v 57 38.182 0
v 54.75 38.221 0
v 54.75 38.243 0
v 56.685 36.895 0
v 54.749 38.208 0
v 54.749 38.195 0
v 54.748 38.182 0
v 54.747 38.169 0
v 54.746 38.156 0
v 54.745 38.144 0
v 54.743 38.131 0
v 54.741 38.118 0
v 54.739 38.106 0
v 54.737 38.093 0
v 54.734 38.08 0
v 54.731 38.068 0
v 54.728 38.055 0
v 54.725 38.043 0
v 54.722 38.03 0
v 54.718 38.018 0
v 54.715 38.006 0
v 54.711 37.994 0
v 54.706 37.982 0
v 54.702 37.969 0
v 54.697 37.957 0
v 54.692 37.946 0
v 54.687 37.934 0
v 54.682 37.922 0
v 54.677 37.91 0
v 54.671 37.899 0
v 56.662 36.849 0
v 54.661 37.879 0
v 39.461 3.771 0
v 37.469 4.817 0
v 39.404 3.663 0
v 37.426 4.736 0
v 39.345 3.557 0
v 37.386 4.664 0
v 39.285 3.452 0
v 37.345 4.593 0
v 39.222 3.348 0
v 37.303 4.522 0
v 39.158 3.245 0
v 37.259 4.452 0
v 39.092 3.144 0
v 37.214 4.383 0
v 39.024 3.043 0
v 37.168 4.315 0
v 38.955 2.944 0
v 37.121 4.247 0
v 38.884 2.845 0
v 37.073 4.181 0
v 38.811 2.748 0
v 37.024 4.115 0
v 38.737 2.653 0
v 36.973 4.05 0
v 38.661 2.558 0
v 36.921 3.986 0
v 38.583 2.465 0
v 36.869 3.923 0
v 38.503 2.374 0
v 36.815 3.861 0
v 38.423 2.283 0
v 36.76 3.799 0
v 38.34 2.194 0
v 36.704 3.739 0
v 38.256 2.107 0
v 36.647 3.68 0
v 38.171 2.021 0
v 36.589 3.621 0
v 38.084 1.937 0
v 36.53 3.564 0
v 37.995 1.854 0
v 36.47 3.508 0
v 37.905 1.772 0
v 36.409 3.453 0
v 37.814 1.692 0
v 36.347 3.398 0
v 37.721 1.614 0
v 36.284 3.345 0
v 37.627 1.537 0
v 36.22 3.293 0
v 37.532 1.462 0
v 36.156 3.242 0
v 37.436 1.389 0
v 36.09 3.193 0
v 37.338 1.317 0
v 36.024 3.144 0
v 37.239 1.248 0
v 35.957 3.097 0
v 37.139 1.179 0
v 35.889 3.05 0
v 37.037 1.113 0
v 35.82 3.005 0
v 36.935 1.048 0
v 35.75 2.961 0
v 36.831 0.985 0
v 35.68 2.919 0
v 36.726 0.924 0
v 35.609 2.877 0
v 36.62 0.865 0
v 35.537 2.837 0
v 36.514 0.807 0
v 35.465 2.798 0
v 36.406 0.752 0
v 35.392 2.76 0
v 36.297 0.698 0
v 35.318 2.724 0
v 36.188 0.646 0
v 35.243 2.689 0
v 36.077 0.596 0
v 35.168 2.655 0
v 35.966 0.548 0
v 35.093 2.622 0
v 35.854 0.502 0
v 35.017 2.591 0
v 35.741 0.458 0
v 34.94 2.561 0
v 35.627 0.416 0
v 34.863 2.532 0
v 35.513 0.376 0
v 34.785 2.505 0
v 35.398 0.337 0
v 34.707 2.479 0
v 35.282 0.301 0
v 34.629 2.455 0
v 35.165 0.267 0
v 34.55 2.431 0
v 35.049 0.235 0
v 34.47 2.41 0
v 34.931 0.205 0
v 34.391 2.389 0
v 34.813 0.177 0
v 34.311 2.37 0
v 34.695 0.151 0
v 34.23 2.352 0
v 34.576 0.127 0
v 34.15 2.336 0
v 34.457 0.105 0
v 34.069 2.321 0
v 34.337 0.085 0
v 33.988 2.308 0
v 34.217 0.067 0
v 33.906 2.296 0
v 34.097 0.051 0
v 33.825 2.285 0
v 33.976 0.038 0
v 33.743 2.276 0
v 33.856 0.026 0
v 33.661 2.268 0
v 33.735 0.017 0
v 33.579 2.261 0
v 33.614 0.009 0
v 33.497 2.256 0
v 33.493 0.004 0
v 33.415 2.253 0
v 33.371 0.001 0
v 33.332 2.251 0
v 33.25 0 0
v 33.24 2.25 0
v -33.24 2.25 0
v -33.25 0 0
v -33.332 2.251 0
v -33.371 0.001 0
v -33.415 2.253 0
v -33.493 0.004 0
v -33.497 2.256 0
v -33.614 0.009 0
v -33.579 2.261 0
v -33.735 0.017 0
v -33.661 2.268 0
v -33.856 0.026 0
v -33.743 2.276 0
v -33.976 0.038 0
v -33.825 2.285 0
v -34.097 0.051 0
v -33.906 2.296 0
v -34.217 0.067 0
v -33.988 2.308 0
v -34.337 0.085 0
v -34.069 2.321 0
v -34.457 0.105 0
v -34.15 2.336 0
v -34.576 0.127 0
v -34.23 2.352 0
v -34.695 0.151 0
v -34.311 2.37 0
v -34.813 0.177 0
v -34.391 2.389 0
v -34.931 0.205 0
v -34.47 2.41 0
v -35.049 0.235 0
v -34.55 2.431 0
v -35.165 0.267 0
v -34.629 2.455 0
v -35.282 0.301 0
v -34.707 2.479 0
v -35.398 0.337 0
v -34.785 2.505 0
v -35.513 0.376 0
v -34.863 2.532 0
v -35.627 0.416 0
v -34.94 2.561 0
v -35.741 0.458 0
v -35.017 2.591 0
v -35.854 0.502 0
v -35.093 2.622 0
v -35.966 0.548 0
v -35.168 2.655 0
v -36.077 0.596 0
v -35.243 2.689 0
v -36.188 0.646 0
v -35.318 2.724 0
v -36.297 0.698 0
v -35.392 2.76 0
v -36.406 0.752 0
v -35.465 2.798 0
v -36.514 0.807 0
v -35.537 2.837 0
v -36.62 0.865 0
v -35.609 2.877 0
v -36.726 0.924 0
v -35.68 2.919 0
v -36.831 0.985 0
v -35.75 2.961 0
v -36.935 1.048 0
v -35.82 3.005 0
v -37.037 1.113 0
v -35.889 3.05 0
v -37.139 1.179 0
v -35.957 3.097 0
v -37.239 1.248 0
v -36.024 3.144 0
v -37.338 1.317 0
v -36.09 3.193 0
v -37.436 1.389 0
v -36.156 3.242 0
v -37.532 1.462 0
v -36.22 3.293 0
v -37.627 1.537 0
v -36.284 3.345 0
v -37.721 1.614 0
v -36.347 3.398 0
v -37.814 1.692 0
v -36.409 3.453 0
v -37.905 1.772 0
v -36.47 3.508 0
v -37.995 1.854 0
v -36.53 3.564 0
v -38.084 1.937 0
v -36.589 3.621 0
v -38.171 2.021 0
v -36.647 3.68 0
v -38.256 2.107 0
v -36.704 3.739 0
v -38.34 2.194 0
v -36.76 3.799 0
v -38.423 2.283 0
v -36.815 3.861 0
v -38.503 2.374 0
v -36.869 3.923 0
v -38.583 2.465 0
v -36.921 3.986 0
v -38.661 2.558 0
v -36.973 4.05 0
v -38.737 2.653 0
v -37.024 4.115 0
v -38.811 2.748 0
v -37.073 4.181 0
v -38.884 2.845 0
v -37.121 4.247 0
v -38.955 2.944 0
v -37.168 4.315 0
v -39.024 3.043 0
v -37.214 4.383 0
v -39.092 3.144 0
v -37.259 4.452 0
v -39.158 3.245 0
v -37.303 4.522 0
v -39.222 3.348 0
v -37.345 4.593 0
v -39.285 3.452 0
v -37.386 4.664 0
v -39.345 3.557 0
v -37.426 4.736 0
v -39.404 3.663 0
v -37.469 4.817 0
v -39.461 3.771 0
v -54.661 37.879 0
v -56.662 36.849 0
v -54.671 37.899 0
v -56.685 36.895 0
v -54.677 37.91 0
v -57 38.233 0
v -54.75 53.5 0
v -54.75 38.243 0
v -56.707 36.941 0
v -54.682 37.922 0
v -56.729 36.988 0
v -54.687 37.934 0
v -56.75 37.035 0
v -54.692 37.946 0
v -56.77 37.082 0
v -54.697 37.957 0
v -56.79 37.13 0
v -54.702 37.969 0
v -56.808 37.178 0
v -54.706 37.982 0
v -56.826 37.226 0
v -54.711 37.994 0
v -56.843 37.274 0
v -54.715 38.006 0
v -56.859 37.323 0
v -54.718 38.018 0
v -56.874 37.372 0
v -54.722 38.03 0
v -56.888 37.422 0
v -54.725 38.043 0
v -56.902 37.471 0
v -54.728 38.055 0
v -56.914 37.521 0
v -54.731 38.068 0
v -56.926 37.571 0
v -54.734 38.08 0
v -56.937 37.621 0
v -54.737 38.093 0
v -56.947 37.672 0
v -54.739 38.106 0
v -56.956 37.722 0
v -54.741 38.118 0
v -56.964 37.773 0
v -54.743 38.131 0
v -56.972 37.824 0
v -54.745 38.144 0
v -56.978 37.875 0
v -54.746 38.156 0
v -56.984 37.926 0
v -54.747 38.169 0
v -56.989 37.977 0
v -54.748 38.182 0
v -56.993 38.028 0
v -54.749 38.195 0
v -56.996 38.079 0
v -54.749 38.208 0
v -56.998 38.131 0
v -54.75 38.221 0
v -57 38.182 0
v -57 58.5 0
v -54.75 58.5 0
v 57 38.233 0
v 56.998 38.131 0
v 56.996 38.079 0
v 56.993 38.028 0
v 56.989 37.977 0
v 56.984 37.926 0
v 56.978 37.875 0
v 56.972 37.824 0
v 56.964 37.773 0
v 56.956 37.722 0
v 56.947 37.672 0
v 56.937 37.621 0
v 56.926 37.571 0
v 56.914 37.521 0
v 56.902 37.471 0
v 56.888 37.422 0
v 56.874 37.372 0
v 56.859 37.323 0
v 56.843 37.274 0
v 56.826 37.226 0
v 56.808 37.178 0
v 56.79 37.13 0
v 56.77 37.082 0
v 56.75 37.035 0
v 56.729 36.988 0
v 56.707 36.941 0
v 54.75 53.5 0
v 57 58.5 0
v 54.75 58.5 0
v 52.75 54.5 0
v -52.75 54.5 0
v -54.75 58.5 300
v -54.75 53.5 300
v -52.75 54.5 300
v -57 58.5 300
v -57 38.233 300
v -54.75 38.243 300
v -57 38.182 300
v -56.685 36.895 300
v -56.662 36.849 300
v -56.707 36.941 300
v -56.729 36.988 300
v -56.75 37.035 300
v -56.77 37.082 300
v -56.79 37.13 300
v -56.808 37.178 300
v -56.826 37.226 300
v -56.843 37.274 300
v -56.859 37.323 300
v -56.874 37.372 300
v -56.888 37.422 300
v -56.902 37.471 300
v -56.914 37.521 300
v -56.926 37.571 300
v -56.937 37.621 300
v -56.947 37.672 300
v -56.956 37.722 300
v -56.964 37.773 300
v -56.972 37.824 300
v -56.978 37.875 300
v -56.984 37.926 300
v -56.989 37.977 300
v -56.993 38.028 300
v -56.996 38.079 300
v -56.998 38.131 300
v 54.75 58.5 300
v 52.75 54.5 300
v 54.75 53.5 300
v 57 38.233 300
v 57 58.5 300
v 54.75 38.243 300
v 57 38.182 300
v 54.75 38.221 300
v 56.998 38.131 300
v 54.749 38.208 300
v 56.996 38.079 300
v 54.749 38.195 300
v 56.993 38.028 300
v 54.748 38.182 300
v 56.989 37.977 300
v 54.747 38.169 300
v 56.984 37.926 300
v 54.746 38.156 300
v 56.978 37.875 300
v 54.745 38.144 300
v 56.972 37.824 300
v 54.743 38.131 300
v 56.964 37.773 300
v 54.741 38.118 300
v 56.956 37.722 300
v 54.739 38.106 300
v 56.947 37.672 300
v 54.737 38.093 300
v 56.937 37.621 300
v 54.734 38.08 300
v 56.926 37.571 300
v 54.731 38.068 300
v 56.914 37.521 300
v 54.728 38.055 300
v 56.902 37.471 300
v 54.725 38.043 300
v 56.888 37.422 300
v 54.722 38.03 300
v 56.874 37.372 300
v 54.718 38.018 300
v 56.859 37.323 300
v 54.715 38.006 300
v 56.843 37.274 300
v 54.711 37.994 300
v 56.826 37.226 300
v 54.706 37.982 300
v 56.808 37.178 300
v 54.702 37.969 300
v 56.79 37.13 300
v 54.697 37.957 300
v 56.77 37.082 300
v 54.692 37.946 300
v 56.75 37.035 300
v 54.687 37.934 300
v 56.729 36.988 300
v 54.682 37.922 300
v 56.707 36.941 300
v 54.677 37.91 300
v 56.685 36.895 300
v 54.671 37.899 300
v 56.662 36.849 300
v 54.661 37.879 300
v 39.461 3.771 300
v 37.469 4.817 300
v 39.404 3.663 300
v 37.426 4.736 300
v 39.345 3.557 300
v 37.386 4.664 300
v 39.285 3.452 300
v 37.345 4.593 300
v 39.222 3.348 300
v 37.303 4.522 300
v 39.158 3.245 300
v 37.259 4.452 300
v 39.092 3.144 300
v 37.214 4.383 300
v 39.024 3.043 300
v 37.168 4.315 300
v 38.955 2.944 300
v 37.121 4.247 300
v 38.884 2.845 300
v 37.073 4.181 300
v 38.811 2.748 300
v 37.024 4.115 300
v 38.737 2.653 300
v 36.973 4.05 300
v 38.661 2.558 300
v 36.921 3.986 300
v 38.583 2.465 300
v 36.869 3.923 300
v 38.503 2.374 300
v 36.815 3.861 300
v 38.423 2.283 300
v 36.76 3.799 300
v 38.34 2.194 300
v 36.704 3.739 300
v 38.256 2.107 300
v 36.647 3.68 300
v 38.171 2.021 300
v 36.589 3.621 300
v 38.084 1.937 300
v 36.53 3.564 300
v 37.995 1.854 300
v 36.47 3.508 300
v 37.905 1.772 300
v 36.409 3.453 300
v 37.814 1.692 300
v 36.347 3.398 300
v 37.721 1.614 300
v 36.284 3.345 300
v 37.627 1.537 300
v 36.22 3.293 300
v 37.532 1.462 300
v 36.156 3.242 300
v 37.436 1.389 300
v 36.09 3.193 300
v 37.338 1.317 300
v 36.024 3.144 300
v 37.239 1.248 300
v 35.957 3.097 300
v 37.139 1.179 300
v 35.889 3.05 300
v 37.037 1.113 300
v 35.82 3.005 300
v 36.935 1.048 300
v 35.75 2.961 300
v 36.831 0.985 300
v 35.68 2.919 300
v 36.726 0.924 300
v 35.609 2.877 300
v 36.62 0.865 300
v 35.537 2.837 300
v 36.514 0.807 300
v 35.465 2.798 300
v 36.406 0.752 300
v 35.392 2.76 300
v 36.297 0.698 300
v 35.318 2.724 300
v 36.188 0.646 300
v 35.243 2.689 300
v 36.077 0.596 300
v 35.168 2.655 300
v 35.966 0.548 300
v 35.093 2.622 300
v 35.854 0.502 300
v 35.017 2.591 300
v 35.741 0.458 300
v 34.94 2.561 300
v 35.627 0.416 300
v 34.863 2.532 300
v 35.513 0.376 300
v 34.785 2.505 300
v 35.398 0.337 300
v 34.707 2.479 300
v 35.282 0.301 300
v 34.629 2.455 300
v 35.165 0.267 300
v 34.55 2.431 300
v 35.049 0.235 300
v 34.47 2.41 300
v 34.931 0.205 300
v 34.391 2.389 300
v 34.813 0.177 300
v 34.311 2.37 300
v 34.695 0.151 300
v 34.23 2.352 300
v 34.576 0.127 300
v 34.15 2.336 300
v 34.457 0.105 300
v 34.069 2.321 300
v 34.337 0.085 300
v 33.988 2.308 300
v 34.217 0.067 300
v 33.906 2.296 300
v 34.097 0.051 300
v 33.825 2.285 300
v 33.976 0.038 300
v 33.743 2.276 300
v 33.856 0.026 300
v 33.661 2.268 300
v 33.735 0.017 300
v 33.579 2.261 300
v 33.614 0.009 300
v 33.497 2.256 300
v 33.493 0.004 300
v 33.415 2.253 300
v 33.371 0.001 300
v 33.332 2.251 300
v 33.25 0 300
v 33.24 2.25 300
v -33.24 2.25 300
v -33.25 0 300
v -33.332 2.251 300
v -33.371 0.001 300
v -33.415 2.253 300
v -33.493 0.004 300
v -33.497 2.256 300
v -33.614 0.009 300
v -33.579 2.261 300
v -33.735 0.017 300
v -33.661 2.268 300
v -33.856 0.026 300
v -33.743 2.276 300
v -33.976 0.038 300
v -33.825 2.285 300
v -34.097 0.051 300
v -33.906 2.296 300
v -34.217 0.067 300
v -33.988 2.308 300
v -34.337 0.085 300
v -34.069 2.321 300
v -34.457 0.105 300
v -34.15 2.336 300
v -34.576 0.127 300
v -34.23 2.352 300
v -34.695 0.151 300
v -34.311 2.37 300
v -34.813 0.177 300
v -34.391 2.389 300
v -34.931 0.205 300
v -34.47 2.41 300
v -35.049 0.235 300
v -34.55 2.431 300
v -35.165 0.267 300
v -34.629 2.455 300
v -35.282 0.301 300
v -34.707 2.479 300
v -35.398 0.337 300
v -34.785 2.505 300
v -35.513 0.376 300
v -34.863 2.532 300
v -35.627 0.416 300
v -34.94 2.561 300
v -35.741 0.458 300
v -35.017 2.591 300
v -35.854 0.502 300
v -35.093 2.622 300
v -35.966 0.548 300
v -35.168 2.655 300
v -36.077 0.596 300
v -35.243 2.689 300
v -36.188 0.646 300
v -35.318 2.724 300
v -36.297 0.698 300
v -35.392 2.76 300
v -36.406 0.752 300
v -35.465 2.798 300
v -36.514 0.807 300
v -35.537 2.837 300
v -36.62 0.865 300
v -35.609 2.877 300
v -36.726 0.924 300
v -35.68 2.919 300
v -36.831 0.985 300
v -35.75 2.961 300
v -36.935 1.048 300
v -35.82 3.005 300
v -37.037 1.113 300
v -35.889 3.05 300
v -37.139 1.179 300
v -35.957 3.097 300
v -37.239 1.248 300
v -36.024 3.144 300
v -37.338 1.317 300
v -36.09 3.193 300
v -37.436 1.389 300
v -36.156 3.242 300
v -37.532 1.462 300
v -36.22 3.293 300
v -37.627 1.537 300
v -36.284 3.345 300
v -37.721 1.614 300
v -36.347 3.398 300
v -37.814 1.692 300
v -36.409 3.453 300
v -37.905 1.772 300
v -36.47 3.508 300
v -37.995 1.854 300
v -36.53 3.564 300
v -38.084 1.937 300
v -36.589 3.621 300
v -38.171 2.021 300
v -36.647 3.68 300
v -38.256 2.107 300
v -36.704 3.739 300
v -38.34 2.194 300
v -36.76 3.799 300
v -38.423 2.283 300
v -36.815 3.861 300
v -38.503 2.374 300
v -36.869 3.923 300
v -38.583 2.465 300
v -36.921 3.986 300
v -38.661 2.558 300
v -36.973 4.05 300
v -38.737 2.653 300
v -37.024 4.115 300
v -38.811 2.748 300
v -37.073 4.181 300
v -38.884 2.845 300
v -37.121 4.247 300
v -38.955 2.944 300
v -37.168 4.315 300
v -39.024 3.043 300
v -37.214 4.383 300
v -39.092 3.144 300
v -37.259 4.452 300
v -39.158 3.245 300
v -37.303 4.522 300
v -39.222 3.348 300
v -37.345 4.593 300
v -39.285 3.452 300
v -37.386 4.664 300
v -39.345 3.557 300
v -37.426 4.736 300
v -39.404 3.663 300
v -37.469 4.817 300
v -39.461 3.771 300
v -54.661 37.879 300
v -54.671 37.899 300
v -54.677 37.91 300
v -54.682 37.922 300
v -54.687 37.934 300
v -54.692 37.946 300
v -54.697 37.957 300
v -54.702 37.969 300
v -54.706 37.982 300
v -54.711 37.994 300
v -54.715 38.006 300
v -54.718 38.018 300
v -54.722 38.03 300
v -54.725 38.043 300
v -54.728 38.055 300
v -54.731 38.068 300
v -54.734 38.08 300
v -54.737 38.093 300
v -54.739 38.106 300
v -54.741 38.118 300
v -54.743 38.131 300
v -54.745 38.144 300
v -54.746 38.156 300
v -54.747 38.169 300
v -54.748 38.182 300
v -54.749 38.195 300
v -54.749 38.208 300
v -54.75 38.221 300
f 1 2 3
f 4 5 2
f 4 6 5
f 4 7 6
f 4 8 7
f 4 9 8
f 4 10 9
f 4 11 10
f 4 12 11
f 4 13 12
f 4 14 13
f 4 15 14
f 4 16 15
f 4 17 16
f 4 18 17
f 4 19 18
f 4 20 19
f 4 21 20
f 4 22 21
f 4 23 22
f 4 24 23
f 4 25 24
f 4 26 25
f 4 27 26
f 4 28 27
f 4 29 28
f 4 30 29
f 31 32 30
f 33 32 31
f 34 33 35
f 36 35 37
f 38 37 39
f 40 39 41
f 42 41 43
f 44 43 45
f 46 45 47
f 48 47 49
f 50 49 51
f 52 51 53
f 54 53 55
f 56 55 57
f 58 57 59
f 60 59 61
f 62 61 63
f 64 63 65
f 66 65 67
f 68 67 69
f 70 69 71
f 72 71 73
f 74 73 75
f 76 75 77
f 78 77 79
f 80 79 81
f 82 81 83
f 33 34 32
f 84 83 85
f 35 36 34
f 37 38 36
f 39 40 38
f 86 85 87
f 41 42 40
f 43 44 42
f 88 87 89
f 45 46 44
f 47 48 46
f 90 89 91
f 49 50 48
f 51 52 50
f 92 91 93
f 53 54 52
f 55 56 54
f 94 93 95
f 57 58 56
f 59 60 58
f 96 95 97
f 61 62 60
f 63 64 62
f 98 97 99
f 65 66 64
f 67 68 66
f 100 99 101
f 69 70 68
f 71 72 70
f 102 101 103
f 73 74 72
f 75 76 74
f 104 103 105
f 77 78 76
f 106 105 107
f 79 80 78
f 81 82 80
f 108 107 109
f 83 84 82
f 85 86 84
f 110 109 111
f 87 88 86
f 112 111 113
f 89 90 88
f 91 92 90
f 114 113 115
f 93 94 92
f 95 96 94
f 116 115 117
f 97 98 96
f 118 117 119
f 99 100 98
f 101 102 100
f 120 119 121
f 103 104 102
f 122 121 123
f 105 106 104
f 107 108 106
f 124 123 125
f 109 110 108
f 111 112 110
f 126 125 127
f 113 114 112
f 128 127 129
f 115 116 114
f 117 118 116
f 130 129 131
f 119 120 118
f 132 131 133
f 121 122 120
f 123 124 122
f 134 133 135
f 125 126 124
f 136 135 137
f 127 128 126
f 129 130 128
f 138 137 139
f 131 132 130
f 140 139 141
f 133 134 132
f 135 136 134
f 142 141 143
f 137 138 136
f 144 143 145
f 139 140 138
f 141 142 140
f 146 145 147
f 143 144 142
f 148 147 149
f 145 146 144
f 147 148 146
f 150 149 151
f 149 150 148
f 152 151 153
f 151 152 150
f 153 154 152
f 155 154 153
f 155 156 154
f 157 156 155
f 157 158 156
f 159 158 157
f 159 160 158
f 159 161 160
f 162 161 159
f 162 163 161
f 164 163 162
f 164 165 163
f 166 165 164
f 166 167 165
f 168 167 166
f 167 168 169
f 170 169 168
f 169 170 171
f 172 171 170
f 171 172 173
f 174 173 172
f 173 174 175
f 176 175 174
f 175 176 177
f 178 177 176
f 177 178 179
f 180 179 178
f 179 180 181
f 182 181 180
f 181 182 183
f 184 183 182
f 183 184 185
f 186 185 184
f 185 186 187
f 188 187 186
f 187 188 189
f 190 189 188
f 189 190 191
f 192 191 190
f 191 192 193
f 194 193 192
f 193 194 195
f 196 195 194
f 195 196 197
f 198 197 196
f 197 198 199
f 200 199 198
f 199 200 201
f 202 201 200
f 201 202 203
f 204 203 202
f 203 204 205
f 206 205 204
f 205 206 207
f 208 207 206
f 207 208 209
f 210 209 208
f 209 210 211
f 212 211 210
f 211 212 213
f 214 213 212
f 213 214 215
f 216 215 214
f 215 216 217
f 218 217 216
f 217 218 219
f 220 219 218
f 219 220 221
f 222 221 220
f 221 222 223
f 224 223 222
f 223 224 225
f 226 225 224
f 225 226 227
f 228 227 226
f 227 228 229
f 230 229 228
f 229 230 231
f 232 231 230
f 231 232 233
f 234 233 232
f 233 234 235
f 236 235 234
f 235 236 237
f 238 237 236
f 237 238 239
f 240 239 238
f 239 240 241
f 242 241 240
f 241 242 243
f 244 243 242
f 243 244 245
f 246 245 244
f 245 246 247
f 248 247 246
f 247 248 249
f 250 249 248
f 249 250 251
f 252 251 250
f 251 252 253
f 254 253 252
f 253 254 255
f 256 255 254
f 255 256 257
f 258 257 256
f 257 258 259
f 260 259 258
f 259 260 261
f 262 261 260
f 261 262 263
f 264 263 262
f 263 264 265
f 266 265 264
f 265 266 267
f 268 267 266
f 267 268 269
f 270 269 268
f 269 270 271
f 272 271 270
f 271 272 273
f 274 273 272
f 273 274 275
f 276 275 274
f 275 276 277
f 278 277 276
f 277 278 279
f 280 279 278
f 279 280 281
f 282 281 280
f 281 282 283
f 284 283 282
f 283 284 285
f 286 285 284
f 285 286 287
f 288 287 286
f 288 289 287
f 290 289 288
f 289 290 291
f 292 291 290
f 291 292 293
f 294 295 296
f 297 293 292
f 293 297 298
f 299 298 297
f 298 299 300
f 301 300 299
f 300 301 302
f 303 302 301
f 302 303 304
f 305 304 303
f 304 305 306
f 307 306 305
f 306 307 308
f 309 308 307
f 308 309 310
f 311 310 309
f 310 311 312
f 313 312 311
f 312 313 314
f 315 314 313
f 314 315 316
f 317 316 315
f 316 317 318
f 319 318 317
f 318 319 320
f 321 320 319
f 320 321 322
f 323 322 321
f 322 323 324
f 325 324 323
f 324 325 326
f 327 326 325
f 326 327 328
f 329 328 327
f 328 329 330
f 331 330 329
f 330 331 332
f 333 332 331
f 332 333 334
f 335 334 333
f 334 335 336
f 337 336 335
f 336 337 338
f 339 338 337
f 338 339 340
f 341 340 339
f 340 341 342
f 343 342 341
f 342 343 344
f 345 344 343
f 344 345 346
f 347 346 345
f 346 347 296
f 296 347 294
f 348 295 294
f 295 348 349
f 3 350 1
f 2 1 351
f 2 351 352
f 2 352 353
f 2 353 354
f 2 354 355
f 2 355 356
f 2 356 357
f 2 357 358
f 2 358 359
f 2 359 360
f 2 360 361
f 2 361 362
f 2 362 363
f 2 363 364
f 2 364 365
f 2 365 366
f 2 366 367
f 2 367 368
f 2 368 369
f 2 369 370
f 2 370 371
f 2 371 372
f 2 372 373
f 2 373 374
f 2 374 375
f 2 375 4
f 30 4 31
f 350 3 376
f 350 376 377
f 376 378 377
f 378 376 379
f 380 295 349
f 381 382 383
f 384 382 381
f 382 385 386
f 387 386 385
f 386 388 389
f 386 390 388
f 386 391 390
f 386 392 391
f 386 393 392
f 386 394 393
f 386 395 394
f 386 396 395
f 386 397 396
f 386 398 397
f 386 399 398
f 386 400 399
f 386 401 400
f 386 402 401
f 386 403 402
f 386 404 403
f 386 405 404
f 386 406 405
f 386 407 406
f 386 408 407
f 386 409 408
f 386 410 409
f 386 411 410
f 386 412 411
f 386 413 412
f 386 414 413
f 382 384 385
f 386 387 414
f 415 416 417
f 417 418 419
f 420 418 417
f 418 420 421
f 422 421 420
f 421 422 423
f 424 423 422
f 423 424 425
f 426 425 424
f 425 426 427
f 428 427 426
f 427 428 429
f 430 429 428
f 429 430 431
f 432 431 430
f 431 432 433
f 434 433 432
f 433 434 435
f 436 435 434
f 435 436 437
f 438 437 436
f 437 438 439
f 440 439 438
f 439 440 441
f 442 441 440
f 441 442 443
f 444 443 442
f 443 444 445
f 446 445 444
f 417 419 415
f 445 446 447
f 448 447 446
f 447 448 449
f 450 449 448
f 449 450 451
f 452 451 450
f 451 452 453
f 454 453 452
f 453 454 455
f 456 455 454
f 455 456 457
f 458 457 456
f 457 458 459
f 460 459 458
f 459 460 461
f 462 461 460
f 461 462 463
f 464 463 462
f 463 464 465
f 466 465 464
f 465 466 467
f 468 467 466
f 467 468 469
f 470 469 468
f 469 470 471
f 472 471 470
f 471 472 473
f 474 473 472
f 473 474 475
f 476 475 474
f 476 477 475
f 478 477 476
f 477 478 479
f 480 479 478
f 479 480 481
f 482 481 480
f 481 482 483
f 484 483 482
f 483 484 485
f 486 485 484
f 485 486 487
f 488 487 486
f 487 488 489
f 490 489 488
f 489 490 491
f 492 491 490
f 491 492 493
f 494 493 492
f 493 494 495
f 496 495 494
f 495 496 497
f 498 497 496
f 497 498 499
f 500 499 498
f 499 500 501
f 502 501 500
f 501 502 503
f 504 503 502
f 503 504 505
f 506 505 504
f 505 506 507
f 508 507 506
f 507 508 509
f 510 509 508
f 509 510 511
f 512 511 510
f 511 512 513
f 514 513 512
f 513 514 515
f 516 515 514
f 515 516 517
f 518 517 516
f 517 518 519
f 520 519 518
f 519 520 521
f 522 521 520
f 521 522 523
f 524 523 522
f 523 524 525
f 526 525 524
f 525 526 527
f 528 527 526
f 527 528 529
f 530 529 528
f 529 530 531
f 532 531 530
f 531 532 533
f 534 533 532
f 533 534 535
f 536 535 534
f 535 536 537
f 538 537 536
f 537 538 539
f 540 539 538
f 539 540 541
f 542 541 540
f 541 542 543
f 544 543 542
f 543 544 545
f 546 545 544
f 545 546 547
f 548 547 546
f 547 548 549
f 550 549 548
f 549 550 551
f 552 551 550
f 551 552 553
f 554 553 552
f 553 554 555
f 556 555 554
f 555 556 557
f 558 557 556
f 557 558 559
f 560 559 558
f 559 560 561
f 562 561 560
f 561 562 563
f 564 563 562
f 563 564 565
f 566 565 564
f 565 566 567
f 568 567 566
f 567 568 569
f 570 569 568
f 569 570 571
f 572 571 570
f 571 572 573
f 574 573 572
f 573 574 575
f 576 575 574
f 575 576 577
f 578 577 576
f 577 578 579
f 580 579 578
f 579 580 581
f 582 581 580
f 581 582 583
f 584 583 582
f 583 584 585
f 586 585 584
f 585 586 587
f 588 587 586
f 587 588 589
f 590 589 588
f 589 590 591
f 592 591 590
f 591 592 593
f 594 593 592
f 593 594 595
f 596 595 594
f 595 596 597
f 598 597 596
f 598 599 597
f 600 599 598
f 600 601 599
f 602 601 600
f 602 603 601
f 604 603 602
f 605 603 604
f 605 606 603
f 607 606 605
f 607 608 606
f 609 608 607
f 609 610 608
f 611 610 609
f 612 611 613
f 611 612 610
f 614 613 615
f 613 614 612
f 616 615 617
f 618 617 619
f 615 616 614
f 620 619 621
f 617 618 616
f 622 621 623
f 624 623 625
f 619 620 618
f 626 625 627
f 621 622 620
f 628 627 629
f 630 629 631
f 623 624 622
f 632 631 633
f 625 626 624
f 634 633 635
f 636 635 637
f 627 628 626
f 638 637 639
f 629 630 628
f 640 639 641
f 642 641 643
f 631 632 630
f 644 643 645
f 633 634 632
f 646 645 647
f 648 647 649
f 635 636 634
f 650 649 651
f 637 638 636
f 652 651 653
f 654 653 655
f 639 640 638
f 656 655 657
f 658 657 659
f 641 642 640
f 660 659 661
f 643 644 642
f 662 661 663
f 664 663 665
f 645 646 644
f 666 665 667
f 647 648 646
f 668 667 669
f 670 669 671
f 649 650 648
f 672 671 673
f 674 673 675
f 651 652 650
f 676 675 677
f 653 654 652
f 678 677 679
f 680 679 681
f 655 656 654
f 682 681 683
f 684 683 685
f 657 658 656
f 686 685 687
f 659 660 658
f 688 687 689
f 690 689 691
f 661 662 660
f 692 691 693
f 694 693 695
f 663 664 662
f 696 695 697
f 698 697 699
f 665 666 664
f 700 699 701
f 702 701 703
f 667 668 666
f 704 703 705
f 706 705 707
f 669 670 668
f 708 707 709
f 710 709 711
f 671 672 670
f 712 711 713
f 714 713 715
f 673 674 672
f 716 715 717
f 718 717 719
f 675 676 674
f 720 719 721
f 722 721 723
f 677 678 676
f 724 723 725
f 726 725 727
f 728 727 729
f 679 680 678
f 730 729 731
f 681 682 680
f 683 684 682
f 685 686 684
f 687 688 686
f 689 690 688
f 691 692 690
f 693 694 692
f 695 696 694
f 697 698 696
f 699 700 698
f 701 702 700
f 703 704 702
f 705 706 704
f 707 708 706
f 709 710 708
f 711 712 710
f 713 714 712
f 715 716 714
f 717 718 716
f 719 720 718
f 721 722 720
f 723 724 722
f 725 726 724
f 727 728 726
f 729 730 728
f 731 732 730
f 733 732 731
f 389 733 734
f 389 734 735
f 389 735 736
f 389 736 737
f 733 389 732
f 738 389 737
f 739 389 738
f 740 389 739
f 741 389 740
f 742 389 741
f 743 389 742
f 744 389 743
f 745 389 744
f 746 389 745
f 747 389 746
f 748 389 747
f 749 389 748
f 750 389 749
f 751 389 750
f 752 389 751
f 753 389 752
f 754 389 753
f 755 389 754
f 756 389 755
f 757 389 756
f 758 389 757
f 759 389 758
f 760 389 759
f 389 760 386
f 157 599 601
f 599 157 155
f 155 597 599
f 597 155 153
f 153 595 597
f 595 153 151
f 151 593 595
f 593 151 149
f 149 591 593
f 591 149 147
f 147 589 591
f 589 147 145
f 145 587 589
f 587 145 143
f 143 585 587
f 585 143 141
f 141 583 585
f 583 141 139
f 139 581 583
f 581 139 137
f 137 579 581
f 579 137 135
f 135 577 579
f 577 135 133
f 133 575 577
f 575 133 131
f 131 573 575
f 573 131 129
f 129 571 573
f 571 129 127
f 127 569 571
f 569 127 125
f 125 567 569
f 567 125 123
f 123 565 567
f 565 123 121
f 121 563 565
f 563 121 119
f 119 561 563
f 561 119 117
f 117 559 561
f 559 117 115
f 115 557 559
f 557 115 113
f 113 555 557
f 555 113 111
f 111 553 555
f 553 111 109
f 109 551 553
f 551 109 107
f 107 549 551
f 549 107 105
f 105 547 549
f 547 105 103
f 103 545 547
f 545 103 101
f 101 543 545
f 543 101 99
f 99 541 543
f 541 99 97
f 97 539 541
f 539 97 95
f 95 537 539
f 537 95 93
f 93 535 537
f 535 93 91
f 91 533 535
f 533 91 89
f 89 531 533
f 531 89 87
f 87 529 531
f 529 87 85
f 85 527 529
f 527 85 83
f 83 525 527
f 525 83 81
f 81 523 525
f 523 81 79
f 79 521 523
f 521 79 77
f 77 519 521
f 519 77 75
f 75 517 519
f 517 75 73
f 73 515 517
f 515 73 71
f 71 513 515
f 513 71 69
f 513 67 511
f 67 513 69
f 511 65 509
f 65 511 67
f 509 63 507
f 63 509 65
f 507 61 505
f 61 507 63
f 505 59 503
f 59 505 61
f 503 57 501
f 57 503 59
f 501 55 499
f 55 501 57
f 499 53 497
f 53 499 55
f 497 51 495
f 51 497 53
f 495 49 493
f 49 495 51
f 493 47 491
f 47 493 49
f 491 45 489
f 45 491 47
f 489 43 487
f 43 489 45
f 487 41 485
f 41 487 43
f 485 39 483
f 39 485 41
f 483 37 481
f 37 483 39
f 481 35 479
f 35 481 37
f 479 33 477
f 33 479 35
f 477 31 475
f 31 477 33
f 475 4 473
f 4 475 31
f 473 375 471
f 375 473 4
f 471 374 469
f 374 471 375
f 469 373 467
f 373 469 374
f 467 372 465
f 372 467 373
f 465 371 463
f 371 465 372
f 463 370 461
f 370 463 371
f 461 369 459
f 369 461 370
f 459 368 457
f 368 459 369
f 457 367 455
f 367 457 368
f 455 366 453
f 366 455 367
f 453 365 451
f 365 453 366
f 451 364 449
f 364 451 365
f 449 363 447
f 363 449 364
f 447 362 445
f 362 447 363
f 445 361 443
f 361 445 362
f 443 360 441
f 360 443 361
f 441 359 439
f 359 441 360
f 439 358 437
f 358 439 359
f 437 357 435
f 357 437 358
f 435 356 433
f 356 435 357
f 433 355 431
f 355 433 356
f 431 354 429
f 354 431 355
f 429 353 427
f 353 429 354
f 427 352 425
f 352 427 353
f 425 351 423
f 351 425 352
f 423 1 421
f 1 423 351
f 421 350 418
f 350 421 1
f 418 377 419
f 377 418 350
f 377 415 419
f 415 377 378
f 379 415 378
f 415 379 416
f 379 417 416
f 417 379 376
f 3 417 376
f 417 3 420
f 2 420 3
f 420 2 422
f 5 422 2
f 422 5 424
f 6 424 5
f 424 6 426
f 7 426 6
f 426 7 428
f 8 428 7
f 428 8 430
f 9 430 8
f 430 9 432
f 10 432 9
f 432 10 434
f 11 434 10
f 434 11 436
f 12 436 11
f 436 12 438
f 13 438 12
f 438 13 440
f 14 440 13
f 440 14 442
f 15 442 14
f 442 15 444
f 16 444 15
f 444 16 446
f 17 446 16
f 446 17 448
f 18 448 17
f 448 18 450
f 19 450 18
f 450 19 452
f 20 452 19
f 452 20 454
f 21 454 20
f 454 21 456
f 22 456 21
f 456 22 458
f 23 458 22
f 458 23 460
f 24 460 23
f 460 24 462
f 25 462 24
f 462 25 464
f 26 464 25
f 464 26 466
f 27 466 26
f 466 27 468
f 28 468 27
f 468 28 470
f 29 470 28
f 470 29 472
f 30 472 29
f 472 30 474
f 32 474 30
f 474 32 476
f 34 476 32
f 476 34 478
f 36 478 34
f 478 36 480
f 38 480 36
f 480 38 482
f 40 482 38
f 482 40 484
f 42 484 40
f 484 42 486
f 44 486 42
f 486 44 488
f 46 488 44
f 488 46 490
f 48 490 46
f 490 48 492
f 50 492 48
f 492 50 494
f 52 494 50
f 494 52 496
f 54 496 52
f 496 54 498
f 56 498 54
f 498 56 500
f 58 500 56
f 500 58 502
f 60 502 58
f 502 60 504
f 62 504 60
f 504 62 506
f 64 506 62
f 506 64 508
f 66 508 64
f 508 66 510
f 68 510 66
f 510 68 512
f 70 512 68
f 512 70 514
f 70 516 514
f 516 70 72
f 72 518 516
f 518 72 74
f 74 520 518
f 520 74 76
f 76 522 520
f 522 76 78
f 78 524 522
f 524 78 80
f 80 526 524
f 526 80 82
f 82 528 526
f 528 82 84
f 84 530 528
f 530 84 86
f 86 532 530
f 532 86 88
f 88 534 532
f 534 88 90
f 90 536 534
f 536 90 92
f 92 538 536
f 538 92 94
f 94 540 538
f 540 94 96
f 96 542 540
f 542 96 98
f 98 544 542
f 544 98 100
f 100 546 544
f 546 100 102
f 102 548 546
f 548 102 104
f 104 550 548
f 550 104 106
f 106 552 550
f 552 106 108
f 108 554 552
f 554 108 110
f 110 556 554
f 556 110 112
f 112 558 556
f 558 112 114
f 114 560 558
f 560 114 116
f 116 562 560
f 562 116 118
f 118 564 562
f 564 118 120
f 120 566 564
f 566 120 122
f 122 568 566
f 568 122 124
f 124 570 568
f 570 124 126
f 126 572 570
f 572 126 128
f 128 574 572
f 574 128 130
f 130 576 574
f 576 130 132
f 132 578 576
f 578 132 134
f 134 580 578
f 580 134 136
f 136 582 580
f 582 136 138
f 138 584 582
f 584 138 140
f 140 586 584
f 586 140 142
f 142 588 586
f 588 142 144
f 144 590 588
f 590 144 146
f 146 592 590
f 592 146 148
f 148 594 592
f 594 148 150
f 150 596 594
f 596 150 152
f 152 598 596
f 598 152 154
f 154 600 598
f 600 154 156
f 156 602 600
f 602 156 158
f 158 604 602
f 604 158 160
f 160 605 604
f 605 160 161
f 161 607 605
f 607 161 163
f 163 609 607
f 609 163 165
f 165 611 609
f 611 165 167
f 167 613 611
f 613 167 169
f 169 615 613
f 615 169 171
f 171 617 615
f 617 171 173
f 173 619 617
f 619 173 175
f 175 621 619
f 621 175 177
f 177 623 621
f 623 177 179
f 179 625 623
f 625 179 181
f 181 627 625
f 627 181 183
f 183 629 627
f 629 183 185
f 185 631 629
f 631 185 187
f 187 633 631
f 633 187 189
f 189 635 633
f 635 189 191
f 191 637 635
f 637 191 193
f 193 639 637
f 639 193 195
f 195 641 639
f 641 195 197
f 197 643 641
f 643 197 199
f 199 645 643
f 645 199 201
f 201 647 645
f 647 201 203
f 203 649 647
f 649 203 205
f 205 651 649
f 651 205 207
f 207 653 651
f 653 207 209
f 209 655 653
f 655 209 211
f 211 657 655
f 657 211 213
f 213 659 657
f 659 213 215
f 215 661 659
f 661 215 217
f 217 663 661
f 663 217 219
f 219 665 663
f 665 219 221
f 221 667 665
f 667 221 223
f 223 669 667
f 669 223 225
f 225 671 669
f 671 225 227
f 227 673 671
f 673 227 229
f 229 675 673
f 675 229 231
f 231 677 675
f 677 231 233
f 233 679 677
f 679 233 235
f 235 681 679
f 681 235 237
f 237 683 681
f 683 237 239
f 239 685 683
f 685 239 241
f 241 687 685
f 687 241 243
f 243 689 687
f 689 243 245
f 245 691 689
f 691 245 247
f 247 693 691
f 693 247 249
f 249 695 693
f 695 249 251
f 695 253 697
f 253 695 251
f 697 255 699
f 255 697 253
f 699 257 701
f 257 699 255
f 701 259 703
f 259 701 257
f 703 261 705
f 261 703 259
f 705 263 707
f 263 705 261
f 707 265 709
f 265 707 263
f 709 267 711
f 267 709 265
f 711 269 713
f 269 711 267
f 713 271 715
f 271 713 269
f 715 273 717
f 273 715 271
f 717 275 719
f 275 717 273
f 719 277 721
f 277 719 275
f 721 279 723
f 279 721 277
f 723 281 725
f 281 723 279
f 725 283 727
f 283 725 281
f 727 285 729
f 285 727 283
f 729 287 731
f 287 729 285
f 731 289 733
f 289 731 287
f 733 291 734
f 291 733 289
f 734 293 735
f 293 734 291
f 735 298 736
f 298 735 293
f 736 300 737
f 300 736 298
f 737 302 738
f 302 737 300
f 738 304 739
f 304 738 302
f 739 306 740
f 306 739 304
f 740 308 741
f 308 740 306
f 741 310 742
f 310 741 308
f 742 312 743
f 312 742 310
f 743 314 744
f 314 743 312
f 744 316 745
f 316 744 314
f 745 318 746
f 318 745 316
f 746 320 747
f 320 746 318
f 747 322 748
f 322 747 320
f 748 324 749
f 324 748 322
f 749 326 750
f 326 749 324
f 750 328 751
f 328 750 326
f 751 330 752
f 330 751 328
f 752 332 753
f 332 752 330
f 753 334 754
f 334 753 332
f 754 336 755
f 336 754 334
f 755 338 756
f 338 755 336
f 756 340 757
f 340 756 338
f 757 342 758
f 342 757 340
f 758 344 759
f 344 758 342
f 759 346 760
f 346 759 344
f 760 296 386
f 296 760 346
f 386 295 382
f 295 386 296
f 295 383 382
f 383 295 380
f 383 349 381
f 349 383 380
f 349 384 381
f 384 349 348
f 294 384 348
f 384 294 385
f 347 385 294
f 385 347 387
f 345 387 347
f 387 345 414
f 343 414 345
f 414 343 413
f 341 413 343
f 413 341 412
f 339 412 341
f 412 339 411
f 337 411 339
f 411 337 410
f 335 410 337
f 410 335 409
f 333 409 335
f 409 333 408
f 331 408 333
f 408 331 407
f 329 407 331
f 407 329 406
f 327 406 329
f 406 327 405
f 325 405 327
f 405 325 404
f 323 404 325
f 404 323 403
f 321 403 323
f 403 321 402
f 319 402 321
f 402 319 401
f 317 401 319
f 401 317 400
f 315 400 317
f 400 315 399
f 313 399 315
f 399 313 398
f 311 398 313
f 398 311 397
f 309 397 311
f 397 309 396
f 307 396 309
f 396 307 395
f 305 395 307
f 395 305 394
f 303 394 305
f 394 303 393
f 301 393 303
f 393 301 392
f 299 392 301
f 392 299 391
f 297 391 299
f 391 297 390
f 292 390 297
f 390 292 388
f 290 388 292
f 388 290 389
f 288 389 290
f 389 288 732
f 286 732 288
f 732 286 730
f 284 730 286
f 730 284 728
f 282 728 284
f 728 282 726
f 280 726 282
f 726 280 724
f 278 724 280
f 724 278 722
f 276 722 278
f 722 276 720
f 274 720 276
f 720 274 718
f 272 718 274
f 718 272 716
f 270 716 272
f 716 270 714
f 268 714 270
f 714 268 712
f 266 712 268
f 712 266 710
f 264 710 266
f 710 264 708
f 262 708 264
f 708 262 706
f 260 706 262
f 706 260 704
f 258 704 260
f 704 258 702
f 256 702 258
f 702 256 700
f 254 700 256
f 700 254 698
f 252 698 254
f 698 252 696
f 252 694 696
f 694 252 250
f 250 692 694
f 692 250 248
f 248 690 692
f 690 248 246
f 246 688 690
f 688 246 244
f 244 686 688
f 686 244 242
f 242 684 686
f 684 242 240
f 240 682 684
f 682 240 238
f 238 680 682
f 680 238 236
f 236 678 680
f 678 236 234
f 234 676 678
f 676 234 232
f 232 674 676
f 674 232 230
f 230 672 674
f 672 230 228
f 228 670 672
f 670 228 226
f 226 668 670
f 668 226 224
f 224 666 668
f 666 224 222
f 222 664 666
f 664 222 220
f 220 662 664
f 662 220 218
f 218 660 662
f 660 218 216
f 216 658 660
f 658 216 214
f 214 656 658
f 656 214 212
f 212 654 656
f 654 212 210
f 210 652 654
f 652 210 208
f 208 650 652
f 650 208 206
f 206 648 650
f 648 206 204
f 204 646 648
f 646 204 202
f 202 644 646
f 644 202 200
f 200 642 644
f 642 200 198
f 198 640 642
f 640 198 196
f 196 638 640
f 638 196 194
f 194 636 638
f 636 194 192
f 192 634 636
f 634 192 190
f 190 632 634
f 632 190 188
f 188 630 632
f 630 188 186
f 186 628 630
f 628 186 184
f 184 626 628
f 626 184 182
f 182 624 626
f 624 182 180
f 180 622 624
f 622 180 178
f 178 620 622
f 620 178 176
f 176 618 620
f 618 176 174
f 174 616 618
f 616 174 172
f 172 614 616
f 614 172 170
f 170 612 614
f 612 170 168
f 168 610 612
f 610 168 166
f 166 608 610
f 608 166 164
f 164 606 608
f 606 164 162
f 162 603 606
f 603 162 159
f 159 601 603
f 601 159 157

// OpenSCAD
$fn = 50;

difference() {
	union() {
		linear_extrude(height = 300.0) {
			polygon(points = [[56.9995601, 38.1820114], [56.9982404, 38.1306519], [56.9960415, 38.0793225], [56.9929638, 38.0280383], [56.9890084, 37.9768144], [56.9841763, 37.9256657], [56.978469, 37.8746072], [56.9718882, 37.823654], [56.9644358, 37.7728209], [56.956114, 37.7221229], [56.9469252, 37.6715749], [56.9368722, 37.6211916], [56.9259578, 37.5709879], [56.9141852, 37.5209784], [56.901558, 37.4711779], [56.8880798, 37.4216009], [56.8737546, 37.372262], [56.8585866, 37.3231757], [56.8425802, 37.2743563], [56.8257401, 37.2258182], [56.8080713, 37.1775755], [56.7895789, 37.1296426], [56.7702684, 37.0820333], [56.7501454, 37.0347617], [56.7292159, 36.9878416], [56.7074859, 36.9412868], [56.6849619, 36.895111], [56.6616504, 36.8493277], [39.460676, 3.7705308], [39.4038067, 3.663443], [39.3450911, 3.5573563], [39.2845467, 3.4523025], [39.2221918, 3.3483131], [39.158045, 3.2454194], [39.0921257, 3.1436522], [39.0244535, 3.043042], [38.9550488, 2.9436191], [38.8839324, 2.8454133], [38.8111257, 2.748454], [38.7366505, 2.6527704], [38.660529, 2.5583911], [38.5827843, 2.4653444], [38.5034396, 2.3736583], [38.4225187, 2.2833604], [38.3400458, 2.1944775], [38.2560458, 2.1070366], [38.1705439, 2.0210637], [38.0835656, 1.9365846], [37.9951371, 1.8536249], [37.905285, 1.7722092], [37.8140361, 1.692362], [37.7214179, 1.6141074], [37.6274581, 1.5374687], [37.532185, 1.4624691], [37.435627, 1.3891309], [37.3378133, 1.3174761], [37.2387731, 1.2475264], [37.1385362, 1.1793026], [37.0371326, 1.1128253], [36.9345928, 1.0481143], [36.8309475, 0.9851892], [36.7262278, 0.9240687], [36.6204652, 0.8647712], [36.5136914, 0.8073146], [36.4059383, 0.751716], [36.2972384, 0.6979921], [36.1876243, 0.6461591], [36.0771288, 0.5962325], [35.9657851, 0.5482272], [35.8536266, 0.5021578], [35.7406869, 0.4580379], [35.627, 0.4158809], [35.5126, 0.3756994], [35.3975211, 0.3375055], [35.2817979, 0.3013105], [35.1654652, 0.2671254], [35.0485578, 0.2349605], [34.9311108, 0.2048253], [34.8131595, 0.176729], [34.6947392, 0.1506799], [34.5758855, 0.1266858], [34.456634, 0.104754], [34.3370205, 0.0848911], [34.2170809, 0.067103], [34.0968512, 0.051395], [33.9763674, 0.0377719], [33.8556658, 0.0262377], [33.7347825, 0.0167959], [33.6137537, 0.0094493], [33.4926159, 0.0042002], [33.3714054, 0.0010501], [33.2501584, 0.0], [-33.2501584, 0.0], [-33.3714054, 0.0010501], [-33.4926159, 0.0042002], [-33.6137537, 0.0094493], [-33.7347825, 0.0167959], [-33.8556658, 0.0262377], [-33.9763674, 0.0377719], [-34.0968512, 0.051395], [-34.2170809, 0.067103], [-34.3370205, 0.0848911], [-34.456634, 0.104754], [-34.5758855, 0.1266858], [-34.6947392, 0.1506799], [-34.8131595, 0.176729], [-34.9311108, 0.2048253], [-35.0485578, 0.2349605], [-35.1654652, 0.2671254], [-35.2817979, 0.3013105], [-35.3975211, 0.3375055], [-35.5126, 0.3756994], [-35.627, 0.4158809], [-35.7406869, 0.4580379], [-35.8536266, 0.5021578], [-35.9657851, 0.5482272], [-36.0771288, 0.5962325], [-36.1876243, 0.6461591], [-36.2972384, 0.6979921], [-36.4059383, 0.751716], [-36.5136914, 0.8073146], [-36.6204652, 0.8647712], [-36.7262278, 0.9240687], [-36.8309475, 0.9851892], [-36.9345928, 1.0481143], [-37.0371326, 1.1128253], [-37.1385362, 1.1793026], [-37.2387731, 1.2475264], [-37.3378133, 1.3174761], [-37.435627, 1.3891309], [-37.532185, 1.4624691], [-37.6274581, 1.5374687], [-37.7214179, 1.6141074], [-37.8140361, 1.692362], [-37.905285, 1.7722092], [-37.9951371, 1.8536249], [-38.0835656, 1.9365846], [-38.1705439, 2.0210637], [-38.2560458, 2.1070366], [-38.3400458, 2.1944775], [-38.4225187, 2.2833604], [-38.5034396, 2.3736583], [-38.5827843, 2.4653444], [-38.660529, 2.5583911], [-38.7366505, 2.6527704], [-38.8111257, 2.748454], [-38.8839324, 2.8454133], [-38.9550488, 2.9436191], [-39.0244535, 3.043042], [-39.0921257, 3.1436522], [-39.158045, 3.2454194], [-39.2221918, 3.3483131], [-39.2845467, 3.4523025], [-39.3450911, 3.5573563], [-39.4038067, 3.663443], [-39.460676, 3.7705308], [-56.6616504, 36.8493277], [-56.6849619, 36.895111], [-56.7074859, 36.9412868], [-56.7292159, 36.9878416], [-56.7501454, 37.0347617], [-56.7702684, 37.0820333], [-56.7895789, 37.1296426], [-56.8080713, 37.1775755], [-56.8257401, 37.2258182], [-56.8425802, 37.2743563], [-56.8585866, 37.3231757], [-56.8737546, 37.372262], [-56.8880798, 37.4216009], [-56.901558, 37.4711779], [-56.9141852, 37.5209784], [-56.9259578, 37.5709879], [-56.9368722, 37.6211916], [-56.9469252, 37.6715749], [-56.956114, 37.7221229], [-56.9644358, 37.7728209], [-56.9718882, 37.823654], [-56.978469, 37.8746072], [-56.9841763, 37.9256657], [-56.9890084, 37.9768144], [-56.9929638, 38.0280383], [-56.9960415, 38.0793225], [-56.9982404, 38.1306519], [-56.9995601, 38.1820114], [-57.0, 38.2333859], [-57.0, 58.5], [-54.75, 58.5], [-52.75, 54.5], [-54.75, 53.5], [-54.75, 38.2430192], [-54.7498075, 38.2205437], [-54.7494777, 38.2077052], [-54.748928, 38.1948743], [-54.7481587, 38.1820547], [-54.7471699, 38.1692501], [-54.745962, 38.1564643], [-54.7445354, 38.1437011], [-54.7428903, 38.1309642], [-54.7410275, 38.1182573], [-54.7389472, 38.1055842], [-54.7366503, 38.0929486], [-54.7341373, 38.0803542], [-54.731409, 38.0678046], [-54.7284662, 38.0553036], [-54.7253097, 38.0428549], [-54.7219405, 38.030462], [-54.7183596, 38.0181286], [-54.714568, 38.0058584], [-54.7105669, 37.9936549], [-54.7063573, 37.9815217], [-54.7019406, 37.9694623], [-54.697318, 37.9574804], [-54.6924909, 37.9455794], [-54.6874607, 37.9337628], [-54.6822289, 37.9220341], [-54.676797, 37.9103967], [-54.6711666, 37.898854], [-54.6609683, 37.8788246], [-37.4689335, 4.8172192], [-37.4257742, 4.735948], [-37.3859321, 4.6639618], [-37.3448492, 4.5926766], [-37.3025377, 4.5221136], [-37.2590103, 4.4522941], [-37.2142801, 4.383239], [-37.1683605, 4.3149691], [-37.1212653, 4.2475048], [-37.0730086, 4.1808663], [-37.0236049, 4.1150736], [-36.973069, 4.0501466], [-36.9214161, 3.9861046], [-36.8686617, 3.922967], [-36.8148216, 3.8607525], [-36.7599119, 3.79948], [-36.7039492, 3.7391677], [-36.6469503, 3.6798338], [-36.5889321, 3.6214961], [-36.5299122, 3.5641721], [-36.4699082, 3.5078789], [-36.4089382, 3.4526335], [-36.3470204, 3.3984525], [-36.2841734, 3.3453521], [-36.2204161, 3.2933482], [-36.1557677, 3.2424565], [-36.0902474, 3.1926922], [-36.023875, 3.1440702], [-35.9566703, 3.0966051], [-35.8886536, 3.0503112], [-35.8198453, 3.0052024], [-35.7502659, 2.9612922], [-35.6799364, 2.9185937], [-35.6088779, 2.8771199], [-35.5371117, 2.836883], [-35.4646593, 2.7978953], [-35.3915424, 2.7601683], [-35.3177831, 2.7237135], [-35.2434034, 2.6885417], [-35.1684256, 2.6546635], [-35.0928723, 2.6220891], [-35.0167661, 2.5908282], [-34.9401299, 2.5608903], [-34.8629866, 2.5322843], [-34.7853593, 2.5050187], [-34.7072715, 2.4791019], [-34.6287465, 2.4545415], [-34.5498078, 2.4313449], [-34.4704792, 2.409519], [-34.3907844, 2.3890705], [-34.3107475, 2.3700055], [-34.2303922, 2.3523296], [-34.1497429, 2.3360482], [-34.0688237, 2.3211662], [-33.9876589, 2.3076881], [-33.9062727, 2.2956178], [-33.8246897, 2.284959], [-33.7429343, 2.2757148], [-33.6610311, 2.2678882], [-33.5790046, 2.2614814], [-33.4968794, 2.2564963], [-33.4146802, 2.2529345], [-33.3324317, 2.250797], [-33.2404148, 2.25], [33.2404148, 2.25], [33.3324317, 2.250797], [33.4146802, 2.2529345], [33.4968794, 2.2564963], [33.5790046, 2.2614814], [33.6610311, 2.2678882], [33.7429343, 2.2757148], [33.8246897, 2.284959], [33.9062727, 2.2956178], [33.9876589, 2.3076881], [34.0688237, 2.3211662], [34.1497429, 2.3360482], [34.2303922, 2.3523296], [34.3107475, 2.3700055], [34.3907844, 2.3890705], [34.4704792, 2.409519], [34.5498078, 2.4313449], [34.6287465, 2.4545415], [34.7072715, 2.4791019], [34.7853593, 2.5050187], [34.8629866, 2.5322843], [34.9401299, 2.5608903], [35.0167661, 2.5908282], [35.0928723, 2.6220891], [35.1684256, 2.6546635], [35.2434034, 2.6885417], [35.3177831, 2.7237135], [35.3915424, 2.7601683], [35.4646593, 2.7978953], [35.5371117, 2.836883], [35.6088779, 2.8771199], [35.6799364, 2.9185937], [35.7502659, 2.9612922], [35.8198453, 3.0052024], [35.8886536, 3.0503112], [35.9566703, 3.0966051], [36.023875, 3.1440702], [36.0902474, 3.1926922], [36.1557677, 3.2424565], [36.2204161, 3.2933482], [36.2841734, 3.3453521], [36.3470204, 3.3984525], [36.4089382, 3.4526335], [36.4699082, 3.5078789], [36.5299122, 3.5641721], [36.5889321, 3.6214961], [36.6469503, 3.6798338], [36.7039492, 3.7391677], [36.7599119, 3.79948], [36.8148216, 3.8607525], [36.8686617, 3.922967], [36.9214161, 3.9861046], [36.973069, 4.0501466], [37.0236049, 4.1150736], [37.0730086, 4.1808663], [37.1212653, 4.2475048], [37.1683605, 4.3149691], [37.2142801, 4.383239], [37.2590103, 4.4522941], [37.3025377, 4.5221136], [37.3448492, 4.5926766], [37.3859321, 4.6639618], [37.4257742, 4.735948], [37.4689335, 4.8172192], [54.6609683, 37.8788246], [54.6711666, 37.898854], [54.676797, 37.9103967], [54.6822289, 37.9220341], [54.6874607, 37.9337628], [54.6924909, 37.9455794], [54.697318, 37.9574804], [54.7019406, 37.9694623], [54.7063573, 37.9815217], [54.7105669, 37.9936549], [54.714568, 38.0058584], [54.7183596, 38.0181286], [54.7219405, 38.030462], [54.7253097, 38.0428549], [54.7284662, 38.0553036], [54.731409, 38.0678046], [54.7341373, 38.0803542], [54.7366503, 38.0929486], [54.7389472, 38.1055842], [54.7410275, 38.1182573], [54.7428903, 38.1309642], [54.7445354, 38.1437011], [54.745962, 38.1564643], [54.7471699, 38.1692501], [54.7481587, 38.1820547], [54.748928, 38.1948743], [54.7494777, 38.2077052], [54.7498075, 38.2205437], [54.75, 38.2430192], [54.75, 53.5], [52.75, 54.5], [54.75, 58.5], [57.0, 58.5], [57.0, 38.2333859]]);
		}
	}
	union();
}
